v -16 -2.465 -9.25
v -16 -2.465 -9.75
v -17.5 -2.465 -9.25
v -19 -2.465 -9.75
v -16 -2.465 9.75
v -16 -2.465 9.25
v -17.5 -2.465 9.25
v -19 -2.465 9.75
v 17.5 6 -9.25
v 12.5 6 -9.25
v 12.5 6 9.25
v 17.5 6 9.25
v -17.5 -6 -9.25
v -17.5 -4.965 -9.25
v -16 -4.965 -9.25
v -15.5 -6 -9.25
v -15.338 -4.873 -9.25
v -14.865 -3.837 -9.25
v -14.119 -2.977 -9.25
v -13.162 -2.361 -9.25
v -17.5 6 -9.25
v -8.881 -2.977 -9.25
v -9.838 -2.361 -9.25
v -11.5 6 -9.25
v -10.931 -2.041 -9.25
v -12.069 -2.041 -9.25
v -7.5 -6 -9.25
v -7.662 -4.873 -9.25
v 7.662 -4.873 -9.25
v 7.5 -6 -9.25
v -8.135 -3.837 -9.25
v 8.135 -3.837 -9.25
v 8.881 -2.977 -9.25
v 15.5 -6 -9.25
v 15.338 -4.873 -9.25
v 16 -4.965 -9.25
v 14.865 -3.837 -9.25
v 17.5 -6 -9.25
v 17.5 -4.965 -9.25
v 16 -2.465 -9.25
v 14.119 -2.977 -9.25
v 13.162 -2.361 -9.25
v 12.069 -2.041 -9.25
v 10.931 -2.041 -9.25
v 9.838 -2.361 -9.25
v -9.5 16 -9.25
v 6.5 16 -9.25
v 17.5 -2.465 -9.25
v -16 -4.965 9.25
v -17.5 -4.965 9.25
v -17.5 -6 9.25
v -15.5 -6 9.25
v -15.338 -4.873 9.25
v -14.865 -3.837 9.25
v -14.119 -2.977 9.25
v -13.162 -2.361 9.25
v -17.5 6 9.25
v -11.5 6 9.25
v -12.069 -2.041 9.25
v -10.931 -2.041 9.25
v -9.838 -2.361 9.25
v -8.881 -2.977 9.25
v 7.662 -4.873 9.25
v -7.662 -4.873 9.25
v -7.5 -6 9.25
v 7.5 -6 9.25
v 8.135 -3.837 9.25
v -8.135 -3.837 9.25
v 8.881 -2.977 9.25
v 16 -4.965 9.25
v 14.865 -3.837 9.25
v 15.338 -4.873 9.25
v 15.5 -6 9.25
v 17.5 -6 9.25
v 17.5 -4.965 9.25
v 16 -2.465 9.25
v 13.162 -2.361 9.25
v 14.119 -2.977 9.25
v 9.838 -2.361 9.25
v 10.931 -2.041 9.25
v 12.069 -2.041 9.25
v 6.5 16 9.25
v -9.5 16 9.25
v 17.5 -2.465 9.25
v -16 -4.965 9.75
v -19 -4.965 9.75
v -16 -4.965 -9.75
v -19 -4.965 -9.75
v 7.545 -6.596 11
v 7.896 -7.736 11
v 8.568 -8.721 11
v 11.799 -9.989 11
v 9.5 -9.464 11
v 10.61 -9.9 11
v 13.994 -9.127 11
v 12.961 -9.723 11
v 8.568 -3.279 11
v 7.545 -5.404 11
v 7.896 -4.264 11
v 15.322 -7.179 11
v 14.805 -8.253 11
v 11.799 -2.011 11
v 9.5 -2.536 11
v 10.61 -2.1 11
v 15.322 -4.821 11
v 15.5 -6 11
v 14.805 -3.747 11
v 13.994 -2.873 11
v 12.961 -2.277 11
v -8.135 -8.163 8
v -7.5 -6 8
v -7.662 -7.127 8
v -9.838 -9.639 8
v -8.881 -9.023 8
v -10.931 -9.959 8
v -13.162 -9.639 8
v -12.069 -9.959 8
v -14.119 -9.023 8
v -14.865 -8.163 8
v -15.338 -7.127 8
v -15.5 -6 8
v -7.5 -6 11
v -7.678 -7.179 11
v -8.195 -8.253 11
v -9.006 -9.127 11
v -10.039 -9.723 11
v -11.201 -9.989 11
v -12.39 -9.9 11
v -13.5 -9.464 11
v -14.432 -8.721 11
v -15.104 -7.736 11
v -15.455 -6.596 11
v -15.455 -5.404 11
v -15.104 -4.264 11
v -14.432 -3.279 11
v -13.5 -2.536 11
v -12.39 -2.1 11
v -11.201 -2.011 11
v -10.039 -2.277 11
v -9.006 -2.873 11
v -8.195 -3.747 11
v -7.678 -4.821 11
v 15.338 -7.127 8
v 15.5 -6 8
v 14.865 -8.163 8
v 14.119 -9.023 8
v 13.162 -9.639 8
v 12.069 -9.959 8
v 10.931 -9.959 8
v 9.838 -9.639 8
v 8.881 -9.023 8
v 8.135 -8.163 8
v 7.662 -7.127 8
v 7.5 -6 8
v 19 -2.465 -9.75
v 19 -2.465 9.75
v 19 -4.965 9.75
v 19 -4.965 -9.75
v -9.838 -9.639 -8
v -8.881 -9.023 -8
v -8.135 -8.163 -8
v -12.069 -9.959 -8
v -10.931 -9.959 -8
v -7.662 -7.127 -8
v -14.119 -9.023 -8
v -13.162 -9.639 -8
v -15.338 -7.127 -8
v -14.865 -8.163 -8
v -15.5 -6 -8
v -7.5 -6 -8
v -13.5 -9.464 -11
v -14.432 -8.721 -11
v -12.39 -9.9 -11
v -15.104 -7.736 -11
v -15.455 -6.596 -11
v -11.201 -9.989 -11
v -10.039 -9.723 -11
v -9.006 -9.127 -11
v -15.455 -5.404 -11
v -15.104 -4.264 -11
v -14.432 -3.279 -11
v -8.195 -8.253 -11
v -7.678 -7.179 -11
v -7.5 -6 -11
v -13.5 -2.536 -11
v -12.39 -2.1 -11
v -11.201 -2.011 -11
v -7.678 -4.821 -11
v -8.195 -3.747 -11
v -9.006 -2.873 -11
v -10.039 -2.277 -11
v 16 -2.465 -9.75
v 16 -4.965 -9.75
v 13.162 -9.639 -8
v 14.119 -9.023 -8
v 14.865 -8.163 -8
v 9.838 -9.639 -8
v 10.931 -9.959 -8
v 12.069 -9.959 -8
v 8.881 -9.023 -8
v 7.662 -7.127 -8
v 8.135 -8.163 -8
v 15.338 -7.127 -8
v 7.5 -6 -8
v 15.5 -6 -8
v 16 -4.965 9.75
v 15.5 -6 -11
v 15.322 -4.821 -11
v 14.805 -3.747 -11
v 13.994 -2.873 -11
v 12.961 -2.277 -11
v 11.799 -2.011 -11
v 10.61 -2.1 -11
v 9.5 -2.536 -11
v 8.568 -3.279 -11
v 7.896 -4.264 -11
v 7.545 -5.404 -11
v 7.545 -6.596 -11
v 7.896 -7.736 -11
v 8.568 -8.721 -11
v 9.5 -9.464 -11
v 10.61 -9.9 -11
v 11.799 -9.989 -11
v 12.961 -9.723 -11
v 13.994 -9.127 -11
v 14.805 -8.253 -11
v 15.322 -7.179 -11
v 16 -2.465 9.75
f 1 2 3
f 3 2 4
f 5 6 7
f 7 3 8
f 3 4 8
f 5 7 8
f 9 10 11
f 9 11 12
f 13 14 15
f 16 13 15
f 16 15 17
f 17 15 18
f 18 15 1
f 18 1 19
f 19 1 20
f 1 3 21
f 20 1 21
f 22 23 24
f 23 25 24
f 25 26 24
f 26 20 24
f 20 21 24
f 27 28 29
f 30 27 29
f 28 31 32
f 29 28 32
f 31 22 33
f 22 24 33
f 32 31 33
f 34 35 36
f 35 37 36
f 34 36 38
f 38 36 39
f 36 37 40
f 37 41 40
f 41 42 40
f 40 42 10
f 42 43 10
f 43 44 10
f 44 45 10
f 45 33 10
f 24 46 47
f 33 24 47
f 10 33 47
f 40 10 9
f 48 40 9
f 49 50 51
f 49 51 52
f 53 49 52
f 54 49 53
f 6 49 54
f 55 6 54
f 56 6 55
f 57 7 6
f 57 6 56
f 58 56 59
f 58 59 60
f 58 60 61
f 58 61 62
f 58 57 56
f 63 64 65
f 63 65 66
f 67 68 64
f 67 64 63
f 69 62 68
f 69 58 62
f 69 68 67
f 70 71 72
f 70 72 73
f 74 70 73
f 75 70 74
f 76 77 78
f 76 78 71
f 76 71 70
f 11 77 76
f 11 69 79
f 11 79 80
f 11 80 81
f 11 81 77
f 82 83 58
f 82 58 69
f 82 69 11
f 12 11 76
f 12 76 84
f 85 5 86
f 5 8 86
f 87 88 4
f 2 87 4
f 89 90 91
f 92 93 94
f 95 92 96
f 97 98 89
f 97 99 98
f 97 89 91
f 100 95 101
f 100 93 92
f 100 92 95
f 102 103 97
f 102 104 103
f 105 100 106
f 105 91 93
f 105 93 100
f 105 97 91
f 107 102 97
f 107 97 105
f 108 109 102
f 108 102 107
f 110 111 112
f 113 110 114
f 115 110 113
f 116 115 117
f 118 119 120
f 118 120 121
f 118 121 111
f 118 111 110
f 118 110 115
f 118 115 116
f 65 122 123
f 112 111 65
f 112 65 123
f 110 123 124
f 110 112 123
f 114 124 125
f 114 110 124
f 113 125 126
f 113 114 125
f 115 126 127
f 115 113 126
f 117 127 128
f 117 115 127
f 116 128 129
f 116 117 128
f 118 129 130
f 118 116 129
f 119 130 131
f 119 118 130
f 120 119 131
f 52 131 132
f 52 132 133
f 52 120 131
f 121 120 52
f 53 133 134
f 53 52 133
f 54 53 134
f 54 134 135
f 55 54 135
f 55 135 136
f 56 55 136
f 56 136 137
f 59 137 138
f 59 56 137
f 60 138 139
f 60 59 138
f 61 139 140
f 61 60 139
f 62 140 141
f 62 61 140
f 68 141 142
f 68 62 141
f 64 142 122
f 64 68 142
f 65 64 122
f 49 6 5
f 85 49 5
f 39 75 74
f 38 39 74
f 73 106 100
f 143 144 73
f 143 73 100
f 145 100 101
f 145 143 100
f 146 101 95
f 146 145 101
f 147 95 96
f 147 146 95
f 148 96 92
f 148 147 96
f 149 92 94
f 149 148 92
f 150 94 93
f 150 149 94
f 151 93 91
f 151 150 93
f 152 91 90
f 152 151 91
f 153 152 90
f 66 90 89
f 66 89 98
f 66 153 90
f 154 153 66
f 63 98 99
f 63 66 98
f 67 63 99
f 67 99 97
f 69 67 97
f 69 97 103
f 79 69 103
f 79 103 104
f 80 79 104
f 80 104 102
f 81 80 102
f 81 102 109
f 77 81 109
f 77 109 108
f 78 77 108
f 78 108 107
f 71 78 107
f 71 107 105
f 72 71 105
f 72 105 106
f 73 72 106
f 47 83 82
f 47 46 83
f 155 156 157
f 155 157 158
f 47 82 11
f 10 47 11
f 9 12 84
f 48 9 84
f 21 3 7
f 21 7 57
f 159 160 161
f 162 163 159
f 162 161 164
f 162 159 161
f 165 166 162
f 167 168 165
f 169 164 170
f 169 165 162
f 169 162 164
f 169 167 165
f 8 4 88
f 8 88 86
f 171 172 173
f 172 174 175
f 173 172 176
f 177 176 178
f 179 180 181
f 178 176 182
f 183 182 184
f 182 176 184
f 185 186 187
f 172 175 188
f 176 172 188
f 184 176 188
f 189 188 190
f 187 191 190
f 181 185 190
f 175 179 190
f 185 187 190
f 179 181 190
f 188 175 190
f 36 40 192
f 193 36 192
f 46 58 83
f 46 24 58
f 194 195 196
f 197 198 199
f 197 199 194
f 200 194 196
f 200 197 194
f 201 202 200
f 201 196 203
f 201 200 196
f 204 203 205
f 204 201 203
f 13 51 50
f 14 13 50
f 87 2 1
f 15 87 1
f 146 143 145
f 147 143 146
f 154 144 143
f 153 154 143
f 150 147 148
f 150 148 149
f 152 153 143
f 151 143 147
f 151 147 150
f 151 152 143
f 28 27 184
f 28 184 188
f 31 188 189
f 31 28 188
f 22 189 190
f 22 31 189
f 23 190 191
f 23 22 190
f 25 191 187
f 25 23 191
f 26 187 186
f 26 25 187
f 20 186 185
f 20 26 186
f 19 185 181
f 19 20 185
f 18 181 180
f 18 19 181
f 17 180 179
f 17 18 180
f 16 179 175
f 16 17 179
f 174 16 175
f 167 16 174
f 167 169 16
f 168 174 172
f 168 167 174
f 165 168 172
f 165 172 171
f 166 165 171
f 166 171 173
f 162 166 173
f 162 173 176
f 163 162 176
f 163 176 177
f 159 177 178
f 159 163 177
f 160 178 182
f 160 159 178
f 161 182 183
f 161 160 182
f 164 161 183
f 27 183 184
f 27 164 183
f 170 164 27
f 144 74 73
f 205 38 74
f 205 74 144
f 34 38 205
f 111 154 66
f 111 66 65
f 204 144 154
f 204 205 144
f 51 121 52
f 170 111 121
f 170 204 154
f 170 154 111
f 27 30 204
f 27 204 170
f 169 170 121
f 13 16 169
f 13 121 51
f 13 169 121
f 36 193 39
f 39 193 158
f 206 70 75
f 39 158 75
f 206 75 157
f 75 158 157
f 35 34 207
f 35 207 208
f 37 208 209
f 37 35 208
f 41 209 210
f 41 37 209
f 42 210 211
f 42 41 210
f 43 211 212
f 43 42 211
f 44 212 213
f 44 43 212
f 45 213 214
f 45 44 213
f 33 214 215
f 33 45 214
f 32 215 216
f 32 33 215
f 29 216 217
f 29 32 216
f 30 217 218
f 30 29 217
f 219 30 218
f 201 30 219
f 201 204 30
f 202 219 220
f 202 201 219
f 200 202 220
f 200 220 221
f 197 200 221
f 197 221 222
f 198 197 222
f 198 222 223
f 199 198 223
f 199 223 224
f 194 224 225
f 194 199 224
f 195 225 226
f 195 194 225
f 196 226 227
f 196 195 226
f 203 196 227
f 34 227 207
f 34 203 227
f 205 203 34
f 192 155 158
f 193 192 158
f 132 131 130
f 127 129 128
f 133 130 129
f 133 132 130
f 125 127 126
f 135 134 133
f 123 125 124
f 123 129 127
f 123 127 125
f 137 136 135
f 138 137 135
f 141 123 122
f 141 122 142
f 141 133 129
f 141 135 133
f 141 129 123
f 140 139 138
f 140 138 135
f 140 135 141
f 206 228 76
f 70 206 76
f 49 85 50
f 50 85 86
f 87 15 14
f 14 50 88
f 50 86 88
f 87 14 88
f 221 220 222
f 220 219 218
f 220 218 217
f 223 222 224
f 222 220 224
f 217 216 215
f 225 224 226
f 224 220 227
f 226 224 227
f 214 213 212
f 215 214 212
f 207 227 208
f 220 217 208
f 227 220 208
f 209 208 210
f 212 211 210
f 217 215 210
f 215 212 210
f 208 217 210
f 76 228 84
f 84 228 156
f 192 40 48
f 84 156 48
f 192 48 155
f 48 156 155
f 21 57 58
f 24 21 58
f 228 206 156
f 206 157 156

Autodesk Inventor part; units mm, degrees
ref_plane "YZ Plane" through (0, 0, 0) normal (1, 0, 0) x (0, 1, 0)
sketch "Sketch1" plane through (0, 0, 0) normal (0, 0, 1) x (1, 0, 0)
  line L0 (17.5, -6) -> (-17.5, -6)
  line L1 (-17.5, -6) -> (-17.5, 6)
  line L2 (-17.5, 6) -> (17.5, 6)
  line L3 (17.5, 6) -> (17.5, -6)
  line L4 (17.5, -6) -> (-17.5, 6) construction
  line L5 (-17.5, -6) -> (17.5, 6) construction
  line L6 (-11.5, 6) -> (-9.5, 16)
  line L7 (-9.5, 16) -> (6.5, 16)
  line L8 (6.5, 16) -> (12.5, 6)
  point P0 (0, 0)
  dimension "d0" = 35
  dimension "d1" = 12
  dimension "d2" = 16
  dimension "d3" = 6
  dimension "d4" = 5
  dimension "d5" = 11
  dimension "d6" = 16
extrude "Extrusion1" add sketch "Sketch1" along normal mid plane 18.5
sketch "Sketch2" plane through (0, 0, 0) normal (0, 0, 1) x (1, 0, 0)
  line L0 (17.5, -6) -> (-17.5, -6) projected
  circle A0 centre (-11.5, -6) radius 4
  circle A1 centre (11.5, -6) radius 4
  line L1 (17.5, -6) -> (17.5, 6) projected
  point P0 (0, 0)
  dimension "d9" = 8
  dimension "d10" = 8
  dimension "d11" = 6
  dimension "d12" = 23
extrude "Extrusion2" add sketch "Sketch2" along normal mid plane 22
sketch "Sketch3" plane through (-17.5, -6, 9.25) normal (-1, 0, 0) x (0, 0, 1)
  line L0 (-17.25, 0) -> (-1.25, 0)
  line L1 (-1.25, 0) -> (-1.25, -5.8773)
  line L2 (-1.25, -5.8773) -> (-17.25, -5.8773)
  line L3 (-17.25, -5.8773) -> (-17.25, 0)
  line L4 (1.75, -4) -> (1.75, 4) projected
  line L5 (0, 0) -> (-18.5, 0) projected
  point P0 (-9.25, 6)
  dimension "d15" = 16
  dimension "d16" = 3
extrude "Extrusion3" cut sketch "Sketch3" against normal blind 35
ref_plane "Work Plane1" through (-19, -6, 9.25) normal (-1, 0, 0) x (0, 0, 1)
sketch "Sketch4" plane through (-19, -6, 9.25) normal (-1, 0, 0) x (0, 0, 1)
  line L0 (-19, 3.5348) -> (0.5, 3.5348)
  line L1 (0.5, 3.5348) -> (0.5, 1.0348)
  line L2 (0.5, 1.0348) -> (-19, 1.0348)
  line L3 (-19, 1.0348) -> (-19, 3.5348)
  line L4 (0, 12) -> (0, 0) projected
  point P0 (-9.25, 6)
  dimension "d20" = 2.5
  dimension "d21" = 19.5
  dimension "d22" = 0.5
extrude "Extrusion4" add sketch "Sketch4" against normal blind 3
mirror "Mirror1" about plane through (0, 0, 0) normal (1, 0, 0) of "Extrusion4"
ref_plane "Work Plane3" through (5.5, 6, 9.25) normal (1, 0, 0) x (0, 0, -1)
sketch "Sketch5" plane through (5.5, 6, 9.25) normal (1, 0, 0) x (0, 0, -1)
  line L0 (1.25, -16) -> (-1.75, -16) projected
  line L1 (20.25, -16) -> (17.25, -16) projected
  circle A0 centre (9.25, -16) radius 2.5
  point P0 (9.25, -6)
  dimension "d26" = 5
boundary_patch "Boundary Patch1"
properties part number "Car"
